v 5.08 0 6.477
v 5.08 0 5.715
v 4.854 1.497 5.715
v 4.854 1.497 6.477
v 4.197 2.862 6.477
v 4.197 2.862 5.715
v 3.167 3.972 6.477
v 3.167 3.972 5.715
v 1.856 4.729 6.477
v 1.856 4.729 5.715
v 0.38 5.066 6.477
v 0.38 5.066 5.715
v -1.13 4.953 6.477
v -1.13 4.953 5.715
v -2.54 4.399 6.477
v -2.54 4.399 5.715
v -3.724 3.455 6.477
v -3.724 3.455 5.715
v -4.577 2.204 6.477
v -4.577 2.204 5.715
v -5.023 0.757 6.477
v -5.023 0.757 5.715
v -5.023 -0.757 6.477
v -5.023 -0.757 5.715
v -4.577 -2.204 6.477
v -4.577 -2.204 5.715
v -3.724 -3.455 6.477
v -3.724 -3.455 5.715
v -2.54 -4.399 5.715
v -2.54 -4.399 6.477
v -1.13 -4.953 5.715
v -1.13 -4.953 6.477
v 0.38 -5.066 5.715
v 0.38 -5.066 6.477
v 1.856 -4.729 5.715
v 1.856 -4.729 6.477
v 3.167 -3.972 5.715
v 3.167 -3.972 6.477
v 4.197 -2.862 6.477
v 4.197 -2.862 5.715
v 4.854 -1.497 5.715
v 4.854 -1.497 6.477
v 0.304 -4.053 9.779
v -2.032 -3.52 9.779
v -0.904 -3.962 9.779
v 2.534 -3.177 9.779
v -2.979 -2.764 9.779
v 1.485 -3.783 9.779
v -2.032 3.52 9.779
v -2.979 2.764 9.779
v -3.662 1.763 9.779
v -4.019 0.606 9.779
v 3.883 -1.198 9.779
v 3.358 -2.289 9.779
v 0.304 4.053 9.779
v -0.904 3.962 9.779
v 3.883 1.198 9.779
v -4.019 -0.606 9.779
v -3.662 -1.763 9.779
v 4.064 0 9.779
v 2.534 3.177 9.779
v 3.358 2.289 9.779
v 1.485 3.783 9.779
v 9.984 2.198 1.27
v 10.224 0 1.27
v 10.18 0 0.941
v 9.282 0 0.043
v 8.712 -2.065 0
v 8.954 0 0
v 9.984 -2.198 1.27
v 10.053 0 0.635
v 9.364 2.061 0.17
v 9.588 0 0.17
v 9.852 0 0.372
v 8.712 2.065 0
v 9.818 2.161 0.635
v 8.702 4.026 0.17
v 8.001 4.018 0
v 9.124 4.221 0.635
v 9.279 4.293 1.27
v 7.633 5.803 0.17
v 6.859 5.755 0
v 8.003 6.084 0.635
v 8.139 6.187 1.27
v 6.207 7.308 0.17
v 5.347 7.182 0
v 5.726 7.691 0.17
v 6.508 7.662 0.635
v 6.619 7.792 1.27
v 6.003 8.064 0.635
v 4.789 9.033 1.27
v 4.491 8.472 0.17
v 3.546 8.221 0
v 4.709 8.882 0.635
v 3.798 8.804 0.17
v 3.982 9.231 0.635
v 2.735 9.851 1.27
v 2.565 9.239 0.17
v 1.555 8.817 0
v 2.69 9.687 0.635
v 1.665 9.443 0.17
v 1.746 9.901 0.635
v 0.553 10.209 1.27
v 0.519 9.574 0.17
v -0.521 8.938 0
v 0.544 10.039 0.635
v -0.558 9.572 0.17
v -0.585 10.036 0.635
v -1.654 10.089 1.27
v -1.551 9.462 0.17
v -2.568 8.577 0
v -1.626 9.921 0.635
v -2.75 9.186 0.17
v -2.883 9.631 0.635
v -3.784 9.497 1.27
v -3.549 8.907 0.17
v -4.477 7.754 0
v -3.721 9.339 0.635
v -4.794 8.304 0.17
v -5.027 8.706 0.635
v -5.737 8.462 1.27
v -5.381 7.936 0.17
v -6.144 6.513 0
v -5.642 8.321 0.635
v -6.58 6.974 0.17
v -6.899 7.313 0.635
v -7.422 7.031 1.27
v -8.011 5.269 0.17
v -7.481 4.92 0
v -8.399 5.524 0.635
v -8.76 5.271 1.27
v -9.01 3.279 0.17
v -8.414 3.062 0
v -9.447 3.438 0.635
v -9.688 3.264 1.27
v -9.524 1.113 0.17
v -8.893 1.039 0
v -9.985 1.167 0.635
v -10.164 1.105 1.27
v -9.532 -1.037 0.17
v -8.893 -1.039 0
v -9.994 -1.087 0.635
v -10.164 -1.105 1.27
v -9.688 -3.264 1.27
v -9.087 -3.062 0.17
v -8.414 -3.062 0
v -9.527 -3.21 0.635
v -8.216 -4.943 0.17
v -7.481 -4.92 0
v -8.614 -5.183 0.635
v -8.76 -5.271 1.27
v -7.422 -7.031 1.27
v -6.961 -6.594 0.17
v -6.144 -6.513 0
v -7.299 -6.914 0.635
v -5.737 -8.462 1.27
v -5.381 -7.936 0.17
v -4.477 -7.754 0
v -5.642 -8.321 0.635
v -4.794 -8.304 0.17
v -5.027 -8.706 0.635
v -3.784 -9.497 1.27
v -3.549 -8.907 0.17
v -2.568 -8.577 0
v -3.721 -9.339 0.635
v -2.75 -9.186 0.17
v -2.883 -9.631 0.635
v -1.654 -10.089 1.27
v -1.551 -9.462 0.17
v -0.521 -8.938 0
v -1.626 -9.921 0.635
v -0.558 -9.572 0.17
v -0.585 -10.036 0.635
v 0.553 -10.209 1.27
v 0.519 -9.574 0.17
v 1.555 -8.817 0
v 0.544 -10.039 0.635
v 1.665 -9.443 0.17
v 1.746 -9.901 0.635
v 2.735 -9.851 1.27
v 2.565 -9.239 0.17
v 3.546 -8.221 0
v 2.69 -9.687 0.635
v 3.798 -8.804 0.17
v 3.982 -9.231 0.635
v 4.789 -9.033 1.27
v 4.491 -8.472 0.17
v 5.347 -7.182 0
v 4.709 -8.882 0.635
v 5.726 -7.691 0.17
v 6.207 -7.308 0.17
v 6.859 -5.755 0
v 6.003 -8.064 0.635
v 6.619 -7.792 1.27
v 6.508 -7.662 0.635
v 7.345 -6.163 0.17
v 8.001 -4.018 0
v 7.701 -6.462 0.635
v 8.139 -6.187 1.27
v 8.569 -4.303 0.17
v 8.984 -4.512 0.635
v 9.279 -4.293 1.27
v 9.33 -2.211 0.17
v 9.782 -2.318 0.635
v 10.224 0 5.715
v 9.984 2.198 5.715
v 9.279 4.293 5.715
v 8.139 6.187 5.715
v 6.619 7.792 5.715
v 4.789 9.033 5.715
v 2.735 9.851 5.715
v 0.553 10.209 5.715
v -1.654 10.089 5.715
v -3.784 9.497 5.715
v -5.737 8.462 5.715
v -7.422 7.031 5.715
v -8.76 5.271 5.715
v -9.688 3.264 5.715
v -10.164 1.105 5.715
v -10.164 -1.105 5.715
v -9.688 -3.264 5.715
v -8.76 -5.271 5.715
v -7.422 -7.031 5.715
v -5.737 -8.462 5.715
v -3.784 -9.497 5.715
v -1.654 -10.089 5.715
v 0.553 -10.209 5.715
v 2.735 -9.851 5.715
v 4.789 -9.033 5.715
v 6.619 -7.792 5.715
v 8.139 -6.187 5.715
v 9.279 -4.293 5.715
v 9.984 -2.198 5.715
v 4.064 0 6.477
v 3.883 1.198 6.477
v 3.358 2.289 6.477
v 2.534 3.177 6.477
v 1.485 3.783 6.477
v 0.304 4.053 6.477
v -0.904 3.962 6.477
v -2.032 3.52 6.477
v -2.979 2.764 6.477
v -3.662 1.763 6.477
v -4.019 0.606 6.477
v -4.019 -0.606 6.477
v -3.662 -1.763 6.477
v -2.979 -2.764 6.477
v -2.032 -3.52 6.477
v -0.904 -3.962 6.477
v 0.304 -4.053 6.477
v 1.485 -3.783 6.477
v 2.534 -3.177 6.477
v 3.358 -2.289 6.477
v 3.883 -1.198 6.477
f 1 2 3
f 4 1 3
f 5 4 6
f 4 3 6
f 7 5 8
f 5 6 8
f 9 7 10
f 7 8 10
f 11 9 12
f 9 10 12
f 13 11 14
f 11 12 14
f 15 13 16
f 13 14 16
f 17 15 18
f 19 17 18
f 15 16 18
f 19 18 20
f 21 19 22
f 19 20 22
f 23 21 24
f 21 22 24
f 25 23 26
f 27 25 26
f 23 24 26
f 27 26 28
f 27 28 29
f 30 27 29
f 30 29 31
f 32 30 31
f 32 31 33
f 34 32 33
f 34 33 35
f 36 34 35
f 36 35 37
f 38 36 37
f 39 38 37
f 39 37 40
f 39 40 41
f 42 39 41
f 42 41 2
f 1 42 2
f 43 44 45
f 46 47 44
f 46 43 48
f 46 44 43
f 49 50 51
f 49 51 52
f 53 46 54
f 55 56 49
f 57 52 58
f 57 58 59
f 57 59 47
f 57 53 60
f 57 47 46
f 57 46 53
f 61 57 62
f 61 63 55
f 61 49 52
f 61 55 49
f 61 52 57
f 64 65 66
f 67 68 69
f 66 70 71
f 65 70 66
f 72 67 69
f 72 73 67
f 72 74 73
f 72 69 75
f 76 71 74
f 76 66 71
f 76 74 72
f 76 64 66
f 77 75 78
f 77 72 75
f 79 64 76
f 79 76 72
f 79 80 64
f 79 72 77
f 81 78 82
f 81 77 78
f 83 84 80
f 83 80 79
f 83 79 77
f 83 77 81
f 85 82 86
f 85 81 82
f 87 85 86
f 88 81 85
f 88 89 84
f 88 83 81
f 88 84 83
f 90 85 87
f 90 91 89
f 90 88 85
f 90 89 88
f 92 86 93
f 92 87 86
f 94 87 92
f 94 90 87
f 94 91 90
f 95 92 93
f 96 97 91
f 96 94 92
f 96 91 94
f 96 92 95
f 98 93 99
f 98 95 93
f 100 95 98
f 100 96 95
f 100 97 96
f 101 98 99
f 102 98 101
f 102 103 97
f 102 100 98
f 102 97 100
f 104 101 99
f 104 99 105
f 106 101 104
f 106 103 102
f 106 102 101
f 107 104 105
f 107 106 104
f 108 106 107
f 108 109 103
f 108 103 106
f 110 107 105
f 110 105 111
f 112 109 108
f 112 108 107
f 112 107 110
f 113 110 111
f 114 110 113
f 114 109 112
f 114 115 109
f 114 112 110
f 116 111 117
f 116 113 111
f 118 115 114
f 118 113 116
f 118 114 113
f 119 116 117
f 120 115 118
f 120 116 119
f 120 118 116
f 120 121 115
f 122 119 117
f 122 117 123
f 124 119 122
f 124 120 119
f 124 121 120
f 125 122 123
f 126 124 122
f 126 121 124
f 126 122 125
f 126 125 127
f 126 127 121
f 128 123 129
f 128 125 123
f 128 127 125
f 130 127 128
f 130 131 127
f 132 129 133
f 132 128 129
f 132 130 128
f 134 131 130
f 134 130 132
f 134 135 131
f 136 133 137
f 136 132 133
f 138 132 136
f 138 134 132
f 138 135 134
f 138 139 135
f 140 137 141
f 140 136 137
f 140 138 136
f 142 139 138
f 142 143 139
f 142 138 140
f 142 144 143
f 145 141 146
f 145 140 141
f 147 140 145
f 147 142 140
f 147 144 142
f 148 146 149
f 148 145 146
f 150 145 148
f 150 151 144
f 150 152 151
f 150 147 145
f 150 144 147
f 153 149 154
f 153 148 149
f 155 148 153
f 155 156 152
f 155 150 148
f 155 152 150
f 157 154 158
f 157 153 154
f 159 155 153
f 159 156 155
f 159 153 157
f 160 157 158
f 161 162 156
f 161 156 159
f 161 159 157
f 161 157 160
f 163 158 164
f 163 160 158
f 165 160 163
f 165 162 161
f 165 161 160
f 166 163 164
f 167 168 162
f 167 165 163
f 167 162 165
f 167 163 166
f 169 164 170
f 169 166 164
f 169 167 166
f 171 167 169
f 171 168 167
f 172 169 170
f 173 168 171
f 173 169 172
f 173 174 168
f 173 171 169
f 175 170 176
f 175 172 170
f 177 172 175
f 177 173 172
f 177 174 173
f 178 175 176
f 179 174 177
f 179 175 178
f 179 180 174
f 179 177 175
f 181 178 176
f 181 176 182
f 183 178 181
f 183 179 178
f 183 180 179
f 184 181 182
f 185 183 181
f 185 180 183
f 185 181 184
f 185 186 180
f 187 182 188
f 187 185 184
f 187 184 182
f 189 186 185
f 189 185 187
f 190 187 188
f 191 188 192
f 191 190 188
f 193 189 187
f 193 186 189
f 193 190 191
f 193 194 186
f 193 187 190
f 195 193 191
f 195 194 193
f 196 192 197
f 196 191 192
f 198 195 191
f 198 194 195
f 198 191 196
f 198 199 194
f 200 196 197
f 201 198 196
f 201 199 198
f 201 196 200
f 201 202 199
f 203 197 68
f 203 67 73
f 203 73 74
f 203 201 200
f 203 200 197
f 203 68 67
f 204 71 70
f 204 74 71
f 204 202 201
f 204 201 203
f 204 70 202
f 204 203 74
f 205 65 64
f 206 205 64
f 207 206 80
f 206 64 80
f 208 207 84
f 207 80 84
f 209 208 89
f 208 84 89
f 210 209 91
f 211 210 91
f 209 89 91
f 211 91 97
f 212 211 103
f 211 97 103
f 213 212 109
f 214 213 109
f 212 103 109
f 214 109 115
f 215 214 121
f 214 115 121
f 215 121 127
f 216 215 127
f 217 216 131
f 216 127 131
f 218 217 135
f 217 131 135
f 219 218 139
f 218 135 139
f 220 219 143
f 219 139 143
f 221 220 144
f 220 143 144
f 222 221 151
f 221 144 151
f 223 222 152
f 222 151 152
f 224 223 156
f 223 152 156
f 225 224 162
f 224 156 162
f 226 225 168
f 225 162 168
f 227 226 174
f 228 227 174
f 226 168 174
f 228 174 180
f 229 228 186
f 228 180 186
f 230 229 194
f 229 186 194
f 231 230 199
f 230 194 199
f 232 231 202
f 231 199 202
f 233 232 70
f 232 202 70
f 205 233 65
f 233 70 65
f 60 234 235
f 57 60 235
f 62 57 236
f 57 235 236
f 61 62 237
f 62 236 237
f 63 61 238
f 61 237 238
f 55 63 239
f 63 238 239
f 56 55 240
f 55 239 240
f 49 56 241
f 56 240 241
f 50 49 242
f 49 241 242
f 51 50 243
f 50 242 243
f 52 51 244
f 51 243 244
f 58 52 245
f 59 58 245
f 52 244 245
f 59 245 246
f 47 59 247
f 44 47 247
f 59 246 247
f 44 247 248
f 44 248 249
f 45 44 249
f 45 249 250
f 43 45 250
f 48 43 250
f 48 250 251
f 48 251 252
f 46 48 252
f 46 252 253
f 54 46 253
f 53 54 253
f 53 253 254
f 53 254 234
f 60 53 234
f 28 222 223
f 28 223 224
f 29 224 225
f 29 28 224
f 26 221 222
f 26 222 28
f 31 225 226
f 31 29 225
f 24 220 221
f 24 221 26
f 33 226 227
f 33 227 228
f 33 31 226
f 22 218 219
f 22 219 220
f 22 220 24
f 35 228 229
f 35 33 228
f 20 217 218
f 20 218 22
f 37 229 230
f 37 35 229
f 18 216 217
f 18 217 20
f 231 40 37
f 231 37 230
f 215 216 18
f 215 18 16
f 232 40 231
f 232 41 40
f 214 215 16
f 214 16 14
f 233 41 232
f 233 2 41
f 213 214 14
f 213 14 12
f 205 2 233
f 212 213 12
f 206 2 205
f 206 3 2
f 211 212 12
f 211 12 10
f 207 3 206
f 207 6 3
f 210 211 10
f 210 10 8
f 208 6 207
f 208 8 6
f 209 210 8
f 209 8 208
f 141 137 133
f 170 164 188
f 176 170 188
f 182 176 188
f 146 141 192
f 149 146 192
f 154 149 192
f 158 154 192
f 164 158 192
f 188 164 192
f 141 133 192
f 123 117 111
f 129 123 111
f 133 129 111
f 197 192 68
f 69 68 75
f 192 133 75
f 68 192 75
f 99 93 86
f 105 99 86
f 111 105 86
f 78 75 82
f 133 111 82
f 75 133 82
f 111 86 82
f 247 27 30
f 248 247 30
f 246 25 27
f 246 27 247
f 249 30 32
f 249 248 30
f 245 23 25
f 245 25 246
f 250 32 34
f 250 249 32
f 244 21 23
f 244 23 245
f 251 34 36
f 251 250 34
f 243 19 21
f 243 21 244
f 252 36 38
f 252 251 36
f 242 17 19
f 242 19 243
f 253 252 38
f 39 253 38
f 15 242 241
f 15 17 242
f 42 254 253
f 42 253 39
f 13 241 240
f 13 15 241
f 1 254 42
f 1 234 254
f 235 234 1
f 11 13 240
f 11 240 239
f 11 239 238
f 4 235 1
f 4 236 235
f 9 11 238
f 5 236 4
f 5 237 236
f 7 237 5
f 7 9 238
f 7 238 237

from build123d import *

# Parameters (mm, degrees)
F0_R     = 10.2235
F3_DEPTH = 5.715
F1_R     = 5.08
F4_DEPTH = 6.477
F2_R     = 4.064
F5_DEPTH = 9.779
F6_R     = 1.27


with BuildPart() as f3:
    # F0 (on Top) → F3 (new body)
    with BuildSketch(Plane.XY):
        Circle(F0_R)
    extrude(amount=F3_DEPTH)

    # F1 (on Top) → F4 (join)
    with BuildSketch(Plane.XY):
        Circle(F1_R)
    extrude(amount=F4_DEPTH)

    # F2 (on Top) → F5 (join)
    with BuildSketch(Plane.XY):
        Circle(F2_R)
    extrude(amount=F5_DEPTH)

    # F6
    f6_edges = [f3.edges().sort_by_distance(p)[0] for p in [
        (-10.2235, 0, 0),
    ]]
    fillet(f6_edges, radius=F6_R)


solid = f3.part
